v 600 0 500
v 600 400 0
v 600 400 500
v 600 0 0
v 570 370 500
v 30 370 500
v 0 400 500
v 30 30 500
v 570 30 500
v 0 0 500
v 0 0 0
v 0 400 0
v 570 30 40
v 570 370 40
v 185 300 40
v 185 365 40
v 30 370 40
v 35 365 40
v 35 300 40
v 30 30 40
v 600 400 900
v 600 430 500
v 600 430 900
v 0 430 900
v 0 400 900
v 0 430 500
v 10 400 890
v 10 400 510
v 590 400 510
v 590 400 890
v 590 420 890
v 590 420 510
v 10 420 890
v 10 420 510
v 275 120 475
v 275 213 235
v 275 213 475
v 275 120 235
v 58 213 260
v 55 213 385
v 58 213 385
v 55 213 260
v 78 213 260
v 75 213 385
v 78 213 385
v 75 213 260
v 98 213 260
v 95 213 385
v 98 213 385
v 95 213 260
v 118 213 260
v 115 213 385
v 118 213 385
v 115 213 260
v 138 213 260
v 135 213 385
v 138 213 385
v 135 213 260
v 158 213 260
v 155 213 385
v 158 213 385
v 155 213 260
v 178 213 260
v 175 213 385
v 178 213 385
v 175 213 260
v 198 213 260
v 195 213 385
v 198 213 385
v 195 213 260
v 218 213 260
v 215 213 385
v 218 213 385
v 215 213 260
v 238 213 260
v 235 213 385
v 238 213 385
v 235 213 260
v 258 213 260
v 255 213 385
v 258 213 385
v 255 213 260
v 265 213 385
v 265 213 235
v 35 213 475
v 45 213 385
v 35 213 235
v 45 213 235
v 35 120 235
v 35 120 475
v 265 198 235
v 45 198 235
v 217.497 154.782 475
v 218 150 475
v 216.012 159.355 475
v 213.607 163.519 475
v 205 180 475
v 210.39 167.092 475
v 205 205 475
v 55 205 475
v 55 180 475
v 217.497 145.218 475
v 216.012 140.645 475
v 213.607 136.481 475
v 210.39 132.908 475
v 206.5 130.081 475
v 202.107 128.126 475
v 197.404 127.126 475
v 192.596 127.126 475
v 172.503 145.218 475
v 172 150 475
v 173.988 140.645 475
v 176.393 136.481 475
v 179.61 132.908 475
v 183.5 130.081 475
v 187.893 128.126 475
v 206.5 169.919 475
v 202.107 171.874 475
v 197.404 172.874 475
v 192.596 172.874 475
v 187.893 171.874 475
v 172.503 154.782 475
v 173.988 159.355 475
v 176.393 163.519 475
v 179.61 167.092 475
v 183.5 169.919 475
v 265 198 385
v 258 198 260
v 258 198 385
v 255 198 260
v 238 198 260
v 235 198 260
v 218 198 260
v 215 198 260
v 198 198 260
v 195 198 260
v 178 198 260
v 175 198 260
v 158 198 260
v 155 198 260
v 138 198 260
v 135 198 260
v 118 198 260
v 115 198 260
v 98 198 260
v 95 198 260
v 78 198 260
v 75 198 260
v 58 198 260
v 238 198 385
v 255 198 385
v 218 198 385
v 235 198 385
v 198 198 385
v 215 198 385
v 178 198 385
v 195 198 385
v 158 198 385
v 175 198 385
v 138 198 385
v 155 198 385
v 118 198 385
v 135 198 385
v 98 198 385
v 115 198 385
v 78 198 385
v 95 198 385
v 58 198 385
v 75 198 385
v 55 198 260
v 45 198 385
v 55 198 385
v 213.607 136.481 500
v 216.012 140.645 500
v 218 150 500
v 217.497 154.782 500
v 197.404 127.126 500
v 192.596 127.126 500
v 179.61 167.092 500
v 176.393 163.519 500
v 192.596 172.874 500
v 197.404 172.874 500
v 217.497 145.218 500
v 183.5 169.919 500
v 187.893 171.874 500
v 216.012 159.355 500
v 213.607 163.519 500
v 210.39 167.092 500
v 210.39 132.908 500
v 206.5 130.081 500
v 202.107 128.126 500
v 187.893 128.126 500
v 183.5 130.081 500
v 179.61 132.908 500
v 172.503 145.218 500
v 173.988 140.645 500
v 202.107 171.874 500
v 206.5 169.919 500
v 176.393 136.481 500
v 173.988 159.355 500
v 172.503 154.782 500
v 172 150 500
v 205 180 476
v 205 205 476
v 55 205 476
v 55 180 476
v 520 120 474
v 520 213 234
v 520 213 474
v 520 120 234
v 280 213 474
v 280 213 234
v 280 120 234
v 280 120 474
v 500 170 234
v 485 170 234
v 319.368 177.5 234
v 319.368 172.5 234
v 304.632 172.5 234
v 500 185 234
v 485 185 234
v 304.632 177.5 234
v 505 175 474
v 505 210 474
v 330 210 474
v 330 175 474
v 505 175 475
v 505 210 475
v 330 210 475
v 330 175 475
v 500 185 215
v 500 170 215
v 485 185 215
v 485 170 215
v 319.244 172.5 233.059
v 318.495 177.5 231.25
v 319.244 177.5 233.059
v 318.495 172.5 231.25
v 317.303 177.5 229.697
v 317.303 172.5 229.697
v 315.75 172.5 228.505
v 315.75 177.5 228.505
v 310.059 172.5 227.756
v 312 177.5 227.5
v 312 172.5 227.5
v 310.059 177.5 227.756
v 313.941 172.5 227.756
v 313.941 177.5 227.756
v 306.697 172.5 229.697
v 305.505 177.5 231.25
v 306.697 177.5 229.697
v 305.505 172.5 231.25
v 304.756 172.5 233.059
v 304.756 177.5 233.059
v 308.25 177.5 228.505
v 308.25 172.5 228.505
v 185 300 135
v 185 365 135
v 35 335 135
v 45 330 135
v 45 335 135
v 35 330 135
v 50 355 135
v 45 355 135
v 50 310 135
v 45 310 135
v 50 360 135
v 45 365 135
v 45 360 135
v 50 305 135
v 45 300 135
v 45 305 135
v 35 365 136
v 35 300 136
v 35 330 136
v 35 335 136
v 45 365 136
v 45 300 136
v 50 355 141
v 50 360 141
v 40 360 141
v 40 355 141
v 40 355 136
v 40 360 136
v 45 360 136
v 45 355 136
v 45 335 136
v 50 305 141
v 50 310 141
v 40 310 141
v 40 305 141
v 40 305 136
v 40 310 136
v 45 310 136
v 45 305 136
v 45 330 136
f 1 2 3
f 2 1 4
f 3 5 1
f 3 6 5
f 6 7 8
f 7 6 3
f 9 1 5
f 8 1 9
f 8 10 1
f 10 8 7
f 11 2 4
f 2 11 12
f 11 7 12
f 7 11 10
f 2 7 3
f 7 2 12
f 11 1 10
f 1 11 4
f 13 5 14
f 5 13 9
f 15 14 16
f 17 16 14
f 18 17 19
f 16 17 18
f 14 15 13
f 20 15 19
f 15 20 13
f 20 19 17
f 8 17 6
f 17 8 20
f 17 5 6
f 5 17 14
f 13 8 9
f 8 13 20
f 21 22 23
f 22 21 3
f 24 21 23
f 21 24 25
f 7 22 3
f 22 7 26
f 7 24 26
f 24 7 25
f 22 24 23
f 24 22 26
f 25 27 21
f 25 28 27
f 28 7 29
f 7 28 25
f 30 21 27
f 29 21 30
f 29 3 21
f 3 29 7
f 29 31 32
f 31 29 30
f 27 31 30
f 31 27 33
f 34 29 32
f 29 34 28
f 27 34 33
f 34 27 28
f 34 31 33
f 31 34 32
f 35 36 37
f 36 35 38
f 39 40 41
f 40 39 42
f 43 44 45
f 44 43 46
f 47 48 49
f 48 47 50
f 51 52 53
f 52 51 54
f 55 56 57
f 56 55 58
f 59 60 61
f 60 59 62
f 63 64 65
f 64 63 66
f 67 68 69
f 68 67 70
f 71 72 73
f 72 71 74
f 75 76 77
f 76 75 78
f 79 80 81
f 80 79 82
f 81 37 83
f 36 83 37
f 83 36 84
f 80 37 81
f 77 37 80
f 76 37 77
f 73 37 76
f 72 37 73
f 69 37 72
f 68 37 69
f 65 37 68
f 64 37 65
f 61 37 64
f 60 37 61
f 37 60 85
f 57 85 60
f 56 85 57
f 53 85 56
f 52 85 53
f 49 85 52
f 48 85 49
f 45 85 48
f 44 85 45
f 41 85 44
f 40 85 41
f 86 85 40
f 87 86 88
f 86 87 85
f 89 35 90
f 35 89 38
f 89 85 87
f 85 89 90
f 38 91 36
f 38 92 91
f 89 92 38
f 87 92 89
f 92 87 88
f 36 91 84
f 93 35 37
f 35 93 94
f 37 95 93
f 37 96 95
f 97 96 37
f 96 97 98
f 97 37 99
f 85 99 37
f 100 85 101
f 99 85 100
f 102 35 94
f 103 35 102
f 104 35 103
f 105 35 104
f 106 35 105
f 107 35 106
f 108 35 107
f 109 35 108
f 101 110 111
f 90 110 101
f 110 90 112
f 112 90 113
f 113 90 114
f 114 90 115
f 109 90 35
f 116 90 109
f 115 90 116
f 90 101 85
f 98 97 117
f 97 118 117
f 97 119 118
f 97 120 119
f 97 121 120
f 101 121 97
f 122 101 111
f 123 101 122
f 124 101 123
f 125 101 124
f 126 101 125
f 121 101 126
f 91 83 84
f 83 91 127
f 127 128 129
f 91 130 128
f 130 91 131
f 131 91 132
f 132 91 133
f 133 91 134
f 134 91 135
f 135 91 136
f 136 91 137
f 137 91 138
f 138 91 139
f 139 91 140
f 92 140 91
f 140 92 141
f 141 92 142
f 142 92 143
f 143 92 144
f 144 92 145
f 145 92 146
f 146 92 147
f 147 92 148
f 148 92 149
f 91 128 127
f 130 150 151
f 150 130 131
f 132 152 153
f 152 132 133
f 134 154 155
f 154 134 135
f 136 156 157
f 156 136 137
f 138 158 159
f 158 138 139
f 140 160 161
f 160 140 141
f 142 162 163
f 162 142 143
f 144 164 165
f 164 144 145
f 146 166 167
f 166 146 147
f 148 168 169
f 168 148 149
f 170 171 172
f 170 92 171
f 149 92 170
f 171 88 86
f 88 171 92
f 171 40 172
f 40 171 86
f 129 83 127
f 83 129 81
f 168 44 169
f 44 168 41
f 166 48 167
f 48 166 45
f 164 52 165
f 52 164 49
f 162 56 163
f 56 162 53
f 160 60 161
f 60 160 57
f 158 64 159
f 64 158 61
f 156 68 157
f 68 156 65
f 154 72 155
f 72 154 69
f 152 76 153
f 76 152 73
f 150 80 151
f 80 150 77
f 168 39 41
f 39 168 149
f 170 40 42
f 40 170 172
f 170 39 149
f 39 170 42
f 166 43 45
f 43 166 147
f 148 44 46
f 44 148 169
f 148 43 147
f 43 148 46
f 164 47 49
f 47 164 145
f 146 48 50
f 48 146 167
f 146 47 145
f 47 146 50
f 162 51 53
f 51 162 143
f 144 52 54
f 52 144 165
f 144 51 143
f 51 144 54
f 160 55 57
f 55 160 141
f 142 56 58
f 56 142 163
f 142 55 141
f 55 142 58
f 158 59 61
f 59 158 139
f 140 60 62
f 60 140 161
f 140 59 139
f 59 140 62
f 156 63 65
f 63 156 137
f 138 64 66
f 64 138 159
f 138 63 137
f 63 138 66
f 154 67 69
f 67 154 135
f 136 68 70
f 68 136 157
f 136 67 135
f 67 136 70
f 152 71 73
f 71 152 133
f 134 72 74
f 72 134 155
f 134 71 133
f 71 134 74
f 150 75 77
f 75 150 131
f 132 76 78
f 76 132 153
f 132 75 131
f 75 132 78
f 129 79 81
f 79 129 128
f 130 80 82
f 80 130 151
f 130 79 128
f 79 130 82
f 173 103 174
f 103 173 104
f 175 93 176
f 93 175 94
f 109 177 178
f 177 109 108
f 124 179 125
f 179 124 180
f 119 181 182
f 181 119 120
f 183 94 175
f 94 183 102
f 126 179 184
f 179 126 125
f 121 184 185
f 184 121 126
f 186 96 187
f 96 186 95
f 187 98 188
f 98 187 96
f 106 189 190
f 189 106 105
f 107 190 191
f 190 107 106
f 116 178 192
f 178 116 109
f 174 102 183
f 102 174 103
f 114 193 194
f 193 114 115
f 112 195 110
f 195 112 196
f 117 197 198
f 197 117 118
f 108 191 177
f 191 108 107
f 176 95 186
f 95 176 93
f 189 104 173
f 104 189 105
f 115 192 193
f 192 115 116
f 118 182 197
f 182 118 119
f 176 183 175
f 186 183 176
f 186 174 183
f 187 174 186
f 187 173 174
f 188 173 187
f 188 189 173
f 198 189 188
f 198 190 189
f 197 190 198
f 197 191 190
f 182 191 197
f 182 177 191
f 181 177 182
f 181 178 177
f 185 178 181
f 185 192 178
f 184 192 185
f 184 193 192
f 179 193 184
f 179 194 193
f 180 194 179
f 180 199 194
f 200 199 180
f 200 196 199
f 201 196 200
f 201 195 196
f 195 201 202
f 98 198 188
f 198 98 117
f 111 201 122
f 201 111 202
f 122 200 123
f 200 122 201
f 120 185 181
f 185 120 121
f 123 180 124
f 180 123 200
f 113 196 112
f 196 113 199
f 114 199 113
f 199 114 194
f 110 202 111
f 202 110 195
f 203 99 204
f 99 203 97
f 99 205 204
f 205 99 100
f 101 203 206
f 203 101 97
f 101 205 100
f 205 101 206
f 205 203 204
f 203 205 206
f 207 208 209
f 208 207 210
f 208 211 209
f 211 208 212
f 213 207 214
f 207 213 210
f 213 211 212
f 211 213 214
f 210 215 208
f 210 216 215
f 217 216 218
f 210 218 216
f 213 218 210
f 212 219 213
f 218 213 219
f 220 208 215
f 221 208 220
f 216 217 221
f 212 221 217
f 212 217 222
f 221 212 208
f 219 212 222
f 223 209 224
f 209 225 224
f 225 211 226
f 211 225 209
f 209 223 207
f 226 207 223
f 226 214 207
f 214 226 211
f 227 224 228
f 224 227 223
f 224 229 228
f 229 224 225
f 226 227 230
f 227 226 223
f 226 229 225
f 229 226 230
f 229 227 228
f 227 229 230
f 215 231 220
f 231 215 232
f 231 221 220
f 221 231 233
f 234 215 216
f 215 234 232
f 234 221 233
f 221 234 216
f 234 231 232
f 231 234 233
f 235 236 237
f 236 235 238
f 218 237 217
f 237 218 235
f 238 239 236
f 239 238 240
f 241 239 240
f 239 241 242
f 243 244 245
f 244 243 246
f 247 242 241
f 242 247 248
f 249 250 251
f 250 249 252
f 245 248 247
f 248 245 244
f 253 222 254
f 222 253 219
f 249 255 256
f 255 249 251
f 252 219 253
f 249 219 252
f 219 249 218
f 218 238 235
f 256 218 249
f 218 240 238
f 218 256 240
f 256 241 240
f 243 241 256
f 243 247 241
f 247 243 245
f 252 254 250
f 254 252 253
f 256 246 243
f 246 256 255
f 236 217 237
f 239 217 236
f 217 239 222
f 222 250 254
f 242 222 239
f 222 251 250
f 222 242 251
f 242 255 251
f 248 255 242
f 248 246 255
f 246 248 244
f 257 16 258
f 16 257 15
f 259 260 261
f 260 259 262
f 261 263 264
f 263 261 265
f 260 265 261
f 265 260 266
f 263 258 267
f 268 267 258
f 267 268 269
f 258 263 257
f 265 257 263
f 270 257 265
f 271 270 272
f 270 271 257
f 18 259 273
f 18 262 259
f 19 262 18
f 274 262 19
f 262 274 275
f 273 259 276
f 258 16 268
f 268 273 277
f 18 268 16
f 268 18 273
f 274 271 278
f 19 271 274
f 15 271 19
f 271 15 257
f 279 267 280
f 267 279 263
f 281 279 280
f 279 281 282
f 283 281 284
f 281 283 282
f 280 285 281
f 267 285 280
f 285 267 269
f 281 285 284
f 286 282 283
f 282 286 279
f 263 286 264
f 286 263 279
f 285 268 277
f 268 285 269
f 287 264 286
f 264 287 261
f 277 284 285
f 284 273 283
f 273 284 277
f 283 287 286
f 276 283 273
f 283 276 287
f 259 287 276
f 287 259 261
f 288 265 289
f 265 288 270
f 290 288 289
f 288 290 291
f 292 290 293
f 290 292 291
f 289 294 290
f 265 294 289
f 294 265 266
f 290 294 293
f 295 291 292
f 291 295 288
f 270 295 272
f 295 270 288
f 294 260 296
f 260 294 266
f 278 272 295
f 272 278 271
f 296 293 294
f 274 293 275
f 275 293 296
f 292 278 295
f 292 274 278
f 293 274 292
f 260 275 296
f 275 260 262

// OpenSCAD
// file: KWTuner.scad
//TODO
module KWTuner() {
translate([0,1,0]) color([0.1,0.1,0.1]) cube([240,240,93]);
    
translate ([50,0,55]) color([0.2,0.0,0.8]) cube([175,1,35]);
    
translate ([205,240,50]) color([0.7,0.7,0.7]) cube([15,20,15]);
    
translate([32,240,55]) color([0.7,0.7,0.7]) cylinder(5,d=15,center=true);
}

KWTuner();
// file: Bleiakku.scad
module bleiakku(){ 
        color([0,0,0]) cube([150,65,95]);
        
        translate([5,55,95]) color([0.5,0.5,0.5]) cube([10,5,6]);    
        translate([0,35,95]) color([1,0,0]) cube([10,30,1]); 
        
        translate([5,5,95]) color([0.5,0.5,0.5]) cube([10,5,6]);    
        translate([0,0,95]) color([0,0,1]) cube([10,30,1]); 
}

bleiakku();
// file: KWTXRX.scad
module KWTXRX() {
translate([0,25,0]) {
    difference() {
    color([0.1,0.1,0.1]) cube([240,240,93]);
    color([0.2,0.2,0.2]) translate([10,90,78]) cube([220,150,15]);
}
}
for(i = [1:11])
    color([0.4,0.4,0.4]) translate([i*20,90,78]) cube([3,150,15]);

//TODO    
translate([160,25,30]) color([0.7,0.7,0.7]) rotate([90,0,0]) cylinder(25,r=23);

translate([12,250,12]) color([0.7,0.7,0.7]) rotate([90,0,0]) cylinder(5,d=16);

translate ([20,24,60]) color([0.2,0.0,0.8]) cube([150,1,25]);
    
translate ([205,240,50]) color([0.7,0.7,0.7]) cube([15,20,15]);
}

KWTXRX();
// file: ZA10.scad
module ZA10(){ difference() {
    color([0.1,0.4,0.0]) cube([600,400,500]);
    color([0.5,0.5,0.5]) translate([30,30,40]) cube([600-60,400-60,500]);
}
difference() {
color([0.1,0.4,0.0]) translate([0,400,500]) cube([600,30,400]);
color([0.5,0.5,0.5]) translate([10,400-10,500+10]) cube([600-20,30,400-20]);
}
}
 
// main file
use <ZA10.scad>
use <KWTXRX.scad>
use <Bleiakku.scad>
use <KWTuner.scad>

ZA10();

translate([35,120,500]) rotate([-90,0,0])KWTXRX();
translate([280,120,475]) rotate([-90,0,0])KWTuner();

translate([35,300,40]) bleiakku();
